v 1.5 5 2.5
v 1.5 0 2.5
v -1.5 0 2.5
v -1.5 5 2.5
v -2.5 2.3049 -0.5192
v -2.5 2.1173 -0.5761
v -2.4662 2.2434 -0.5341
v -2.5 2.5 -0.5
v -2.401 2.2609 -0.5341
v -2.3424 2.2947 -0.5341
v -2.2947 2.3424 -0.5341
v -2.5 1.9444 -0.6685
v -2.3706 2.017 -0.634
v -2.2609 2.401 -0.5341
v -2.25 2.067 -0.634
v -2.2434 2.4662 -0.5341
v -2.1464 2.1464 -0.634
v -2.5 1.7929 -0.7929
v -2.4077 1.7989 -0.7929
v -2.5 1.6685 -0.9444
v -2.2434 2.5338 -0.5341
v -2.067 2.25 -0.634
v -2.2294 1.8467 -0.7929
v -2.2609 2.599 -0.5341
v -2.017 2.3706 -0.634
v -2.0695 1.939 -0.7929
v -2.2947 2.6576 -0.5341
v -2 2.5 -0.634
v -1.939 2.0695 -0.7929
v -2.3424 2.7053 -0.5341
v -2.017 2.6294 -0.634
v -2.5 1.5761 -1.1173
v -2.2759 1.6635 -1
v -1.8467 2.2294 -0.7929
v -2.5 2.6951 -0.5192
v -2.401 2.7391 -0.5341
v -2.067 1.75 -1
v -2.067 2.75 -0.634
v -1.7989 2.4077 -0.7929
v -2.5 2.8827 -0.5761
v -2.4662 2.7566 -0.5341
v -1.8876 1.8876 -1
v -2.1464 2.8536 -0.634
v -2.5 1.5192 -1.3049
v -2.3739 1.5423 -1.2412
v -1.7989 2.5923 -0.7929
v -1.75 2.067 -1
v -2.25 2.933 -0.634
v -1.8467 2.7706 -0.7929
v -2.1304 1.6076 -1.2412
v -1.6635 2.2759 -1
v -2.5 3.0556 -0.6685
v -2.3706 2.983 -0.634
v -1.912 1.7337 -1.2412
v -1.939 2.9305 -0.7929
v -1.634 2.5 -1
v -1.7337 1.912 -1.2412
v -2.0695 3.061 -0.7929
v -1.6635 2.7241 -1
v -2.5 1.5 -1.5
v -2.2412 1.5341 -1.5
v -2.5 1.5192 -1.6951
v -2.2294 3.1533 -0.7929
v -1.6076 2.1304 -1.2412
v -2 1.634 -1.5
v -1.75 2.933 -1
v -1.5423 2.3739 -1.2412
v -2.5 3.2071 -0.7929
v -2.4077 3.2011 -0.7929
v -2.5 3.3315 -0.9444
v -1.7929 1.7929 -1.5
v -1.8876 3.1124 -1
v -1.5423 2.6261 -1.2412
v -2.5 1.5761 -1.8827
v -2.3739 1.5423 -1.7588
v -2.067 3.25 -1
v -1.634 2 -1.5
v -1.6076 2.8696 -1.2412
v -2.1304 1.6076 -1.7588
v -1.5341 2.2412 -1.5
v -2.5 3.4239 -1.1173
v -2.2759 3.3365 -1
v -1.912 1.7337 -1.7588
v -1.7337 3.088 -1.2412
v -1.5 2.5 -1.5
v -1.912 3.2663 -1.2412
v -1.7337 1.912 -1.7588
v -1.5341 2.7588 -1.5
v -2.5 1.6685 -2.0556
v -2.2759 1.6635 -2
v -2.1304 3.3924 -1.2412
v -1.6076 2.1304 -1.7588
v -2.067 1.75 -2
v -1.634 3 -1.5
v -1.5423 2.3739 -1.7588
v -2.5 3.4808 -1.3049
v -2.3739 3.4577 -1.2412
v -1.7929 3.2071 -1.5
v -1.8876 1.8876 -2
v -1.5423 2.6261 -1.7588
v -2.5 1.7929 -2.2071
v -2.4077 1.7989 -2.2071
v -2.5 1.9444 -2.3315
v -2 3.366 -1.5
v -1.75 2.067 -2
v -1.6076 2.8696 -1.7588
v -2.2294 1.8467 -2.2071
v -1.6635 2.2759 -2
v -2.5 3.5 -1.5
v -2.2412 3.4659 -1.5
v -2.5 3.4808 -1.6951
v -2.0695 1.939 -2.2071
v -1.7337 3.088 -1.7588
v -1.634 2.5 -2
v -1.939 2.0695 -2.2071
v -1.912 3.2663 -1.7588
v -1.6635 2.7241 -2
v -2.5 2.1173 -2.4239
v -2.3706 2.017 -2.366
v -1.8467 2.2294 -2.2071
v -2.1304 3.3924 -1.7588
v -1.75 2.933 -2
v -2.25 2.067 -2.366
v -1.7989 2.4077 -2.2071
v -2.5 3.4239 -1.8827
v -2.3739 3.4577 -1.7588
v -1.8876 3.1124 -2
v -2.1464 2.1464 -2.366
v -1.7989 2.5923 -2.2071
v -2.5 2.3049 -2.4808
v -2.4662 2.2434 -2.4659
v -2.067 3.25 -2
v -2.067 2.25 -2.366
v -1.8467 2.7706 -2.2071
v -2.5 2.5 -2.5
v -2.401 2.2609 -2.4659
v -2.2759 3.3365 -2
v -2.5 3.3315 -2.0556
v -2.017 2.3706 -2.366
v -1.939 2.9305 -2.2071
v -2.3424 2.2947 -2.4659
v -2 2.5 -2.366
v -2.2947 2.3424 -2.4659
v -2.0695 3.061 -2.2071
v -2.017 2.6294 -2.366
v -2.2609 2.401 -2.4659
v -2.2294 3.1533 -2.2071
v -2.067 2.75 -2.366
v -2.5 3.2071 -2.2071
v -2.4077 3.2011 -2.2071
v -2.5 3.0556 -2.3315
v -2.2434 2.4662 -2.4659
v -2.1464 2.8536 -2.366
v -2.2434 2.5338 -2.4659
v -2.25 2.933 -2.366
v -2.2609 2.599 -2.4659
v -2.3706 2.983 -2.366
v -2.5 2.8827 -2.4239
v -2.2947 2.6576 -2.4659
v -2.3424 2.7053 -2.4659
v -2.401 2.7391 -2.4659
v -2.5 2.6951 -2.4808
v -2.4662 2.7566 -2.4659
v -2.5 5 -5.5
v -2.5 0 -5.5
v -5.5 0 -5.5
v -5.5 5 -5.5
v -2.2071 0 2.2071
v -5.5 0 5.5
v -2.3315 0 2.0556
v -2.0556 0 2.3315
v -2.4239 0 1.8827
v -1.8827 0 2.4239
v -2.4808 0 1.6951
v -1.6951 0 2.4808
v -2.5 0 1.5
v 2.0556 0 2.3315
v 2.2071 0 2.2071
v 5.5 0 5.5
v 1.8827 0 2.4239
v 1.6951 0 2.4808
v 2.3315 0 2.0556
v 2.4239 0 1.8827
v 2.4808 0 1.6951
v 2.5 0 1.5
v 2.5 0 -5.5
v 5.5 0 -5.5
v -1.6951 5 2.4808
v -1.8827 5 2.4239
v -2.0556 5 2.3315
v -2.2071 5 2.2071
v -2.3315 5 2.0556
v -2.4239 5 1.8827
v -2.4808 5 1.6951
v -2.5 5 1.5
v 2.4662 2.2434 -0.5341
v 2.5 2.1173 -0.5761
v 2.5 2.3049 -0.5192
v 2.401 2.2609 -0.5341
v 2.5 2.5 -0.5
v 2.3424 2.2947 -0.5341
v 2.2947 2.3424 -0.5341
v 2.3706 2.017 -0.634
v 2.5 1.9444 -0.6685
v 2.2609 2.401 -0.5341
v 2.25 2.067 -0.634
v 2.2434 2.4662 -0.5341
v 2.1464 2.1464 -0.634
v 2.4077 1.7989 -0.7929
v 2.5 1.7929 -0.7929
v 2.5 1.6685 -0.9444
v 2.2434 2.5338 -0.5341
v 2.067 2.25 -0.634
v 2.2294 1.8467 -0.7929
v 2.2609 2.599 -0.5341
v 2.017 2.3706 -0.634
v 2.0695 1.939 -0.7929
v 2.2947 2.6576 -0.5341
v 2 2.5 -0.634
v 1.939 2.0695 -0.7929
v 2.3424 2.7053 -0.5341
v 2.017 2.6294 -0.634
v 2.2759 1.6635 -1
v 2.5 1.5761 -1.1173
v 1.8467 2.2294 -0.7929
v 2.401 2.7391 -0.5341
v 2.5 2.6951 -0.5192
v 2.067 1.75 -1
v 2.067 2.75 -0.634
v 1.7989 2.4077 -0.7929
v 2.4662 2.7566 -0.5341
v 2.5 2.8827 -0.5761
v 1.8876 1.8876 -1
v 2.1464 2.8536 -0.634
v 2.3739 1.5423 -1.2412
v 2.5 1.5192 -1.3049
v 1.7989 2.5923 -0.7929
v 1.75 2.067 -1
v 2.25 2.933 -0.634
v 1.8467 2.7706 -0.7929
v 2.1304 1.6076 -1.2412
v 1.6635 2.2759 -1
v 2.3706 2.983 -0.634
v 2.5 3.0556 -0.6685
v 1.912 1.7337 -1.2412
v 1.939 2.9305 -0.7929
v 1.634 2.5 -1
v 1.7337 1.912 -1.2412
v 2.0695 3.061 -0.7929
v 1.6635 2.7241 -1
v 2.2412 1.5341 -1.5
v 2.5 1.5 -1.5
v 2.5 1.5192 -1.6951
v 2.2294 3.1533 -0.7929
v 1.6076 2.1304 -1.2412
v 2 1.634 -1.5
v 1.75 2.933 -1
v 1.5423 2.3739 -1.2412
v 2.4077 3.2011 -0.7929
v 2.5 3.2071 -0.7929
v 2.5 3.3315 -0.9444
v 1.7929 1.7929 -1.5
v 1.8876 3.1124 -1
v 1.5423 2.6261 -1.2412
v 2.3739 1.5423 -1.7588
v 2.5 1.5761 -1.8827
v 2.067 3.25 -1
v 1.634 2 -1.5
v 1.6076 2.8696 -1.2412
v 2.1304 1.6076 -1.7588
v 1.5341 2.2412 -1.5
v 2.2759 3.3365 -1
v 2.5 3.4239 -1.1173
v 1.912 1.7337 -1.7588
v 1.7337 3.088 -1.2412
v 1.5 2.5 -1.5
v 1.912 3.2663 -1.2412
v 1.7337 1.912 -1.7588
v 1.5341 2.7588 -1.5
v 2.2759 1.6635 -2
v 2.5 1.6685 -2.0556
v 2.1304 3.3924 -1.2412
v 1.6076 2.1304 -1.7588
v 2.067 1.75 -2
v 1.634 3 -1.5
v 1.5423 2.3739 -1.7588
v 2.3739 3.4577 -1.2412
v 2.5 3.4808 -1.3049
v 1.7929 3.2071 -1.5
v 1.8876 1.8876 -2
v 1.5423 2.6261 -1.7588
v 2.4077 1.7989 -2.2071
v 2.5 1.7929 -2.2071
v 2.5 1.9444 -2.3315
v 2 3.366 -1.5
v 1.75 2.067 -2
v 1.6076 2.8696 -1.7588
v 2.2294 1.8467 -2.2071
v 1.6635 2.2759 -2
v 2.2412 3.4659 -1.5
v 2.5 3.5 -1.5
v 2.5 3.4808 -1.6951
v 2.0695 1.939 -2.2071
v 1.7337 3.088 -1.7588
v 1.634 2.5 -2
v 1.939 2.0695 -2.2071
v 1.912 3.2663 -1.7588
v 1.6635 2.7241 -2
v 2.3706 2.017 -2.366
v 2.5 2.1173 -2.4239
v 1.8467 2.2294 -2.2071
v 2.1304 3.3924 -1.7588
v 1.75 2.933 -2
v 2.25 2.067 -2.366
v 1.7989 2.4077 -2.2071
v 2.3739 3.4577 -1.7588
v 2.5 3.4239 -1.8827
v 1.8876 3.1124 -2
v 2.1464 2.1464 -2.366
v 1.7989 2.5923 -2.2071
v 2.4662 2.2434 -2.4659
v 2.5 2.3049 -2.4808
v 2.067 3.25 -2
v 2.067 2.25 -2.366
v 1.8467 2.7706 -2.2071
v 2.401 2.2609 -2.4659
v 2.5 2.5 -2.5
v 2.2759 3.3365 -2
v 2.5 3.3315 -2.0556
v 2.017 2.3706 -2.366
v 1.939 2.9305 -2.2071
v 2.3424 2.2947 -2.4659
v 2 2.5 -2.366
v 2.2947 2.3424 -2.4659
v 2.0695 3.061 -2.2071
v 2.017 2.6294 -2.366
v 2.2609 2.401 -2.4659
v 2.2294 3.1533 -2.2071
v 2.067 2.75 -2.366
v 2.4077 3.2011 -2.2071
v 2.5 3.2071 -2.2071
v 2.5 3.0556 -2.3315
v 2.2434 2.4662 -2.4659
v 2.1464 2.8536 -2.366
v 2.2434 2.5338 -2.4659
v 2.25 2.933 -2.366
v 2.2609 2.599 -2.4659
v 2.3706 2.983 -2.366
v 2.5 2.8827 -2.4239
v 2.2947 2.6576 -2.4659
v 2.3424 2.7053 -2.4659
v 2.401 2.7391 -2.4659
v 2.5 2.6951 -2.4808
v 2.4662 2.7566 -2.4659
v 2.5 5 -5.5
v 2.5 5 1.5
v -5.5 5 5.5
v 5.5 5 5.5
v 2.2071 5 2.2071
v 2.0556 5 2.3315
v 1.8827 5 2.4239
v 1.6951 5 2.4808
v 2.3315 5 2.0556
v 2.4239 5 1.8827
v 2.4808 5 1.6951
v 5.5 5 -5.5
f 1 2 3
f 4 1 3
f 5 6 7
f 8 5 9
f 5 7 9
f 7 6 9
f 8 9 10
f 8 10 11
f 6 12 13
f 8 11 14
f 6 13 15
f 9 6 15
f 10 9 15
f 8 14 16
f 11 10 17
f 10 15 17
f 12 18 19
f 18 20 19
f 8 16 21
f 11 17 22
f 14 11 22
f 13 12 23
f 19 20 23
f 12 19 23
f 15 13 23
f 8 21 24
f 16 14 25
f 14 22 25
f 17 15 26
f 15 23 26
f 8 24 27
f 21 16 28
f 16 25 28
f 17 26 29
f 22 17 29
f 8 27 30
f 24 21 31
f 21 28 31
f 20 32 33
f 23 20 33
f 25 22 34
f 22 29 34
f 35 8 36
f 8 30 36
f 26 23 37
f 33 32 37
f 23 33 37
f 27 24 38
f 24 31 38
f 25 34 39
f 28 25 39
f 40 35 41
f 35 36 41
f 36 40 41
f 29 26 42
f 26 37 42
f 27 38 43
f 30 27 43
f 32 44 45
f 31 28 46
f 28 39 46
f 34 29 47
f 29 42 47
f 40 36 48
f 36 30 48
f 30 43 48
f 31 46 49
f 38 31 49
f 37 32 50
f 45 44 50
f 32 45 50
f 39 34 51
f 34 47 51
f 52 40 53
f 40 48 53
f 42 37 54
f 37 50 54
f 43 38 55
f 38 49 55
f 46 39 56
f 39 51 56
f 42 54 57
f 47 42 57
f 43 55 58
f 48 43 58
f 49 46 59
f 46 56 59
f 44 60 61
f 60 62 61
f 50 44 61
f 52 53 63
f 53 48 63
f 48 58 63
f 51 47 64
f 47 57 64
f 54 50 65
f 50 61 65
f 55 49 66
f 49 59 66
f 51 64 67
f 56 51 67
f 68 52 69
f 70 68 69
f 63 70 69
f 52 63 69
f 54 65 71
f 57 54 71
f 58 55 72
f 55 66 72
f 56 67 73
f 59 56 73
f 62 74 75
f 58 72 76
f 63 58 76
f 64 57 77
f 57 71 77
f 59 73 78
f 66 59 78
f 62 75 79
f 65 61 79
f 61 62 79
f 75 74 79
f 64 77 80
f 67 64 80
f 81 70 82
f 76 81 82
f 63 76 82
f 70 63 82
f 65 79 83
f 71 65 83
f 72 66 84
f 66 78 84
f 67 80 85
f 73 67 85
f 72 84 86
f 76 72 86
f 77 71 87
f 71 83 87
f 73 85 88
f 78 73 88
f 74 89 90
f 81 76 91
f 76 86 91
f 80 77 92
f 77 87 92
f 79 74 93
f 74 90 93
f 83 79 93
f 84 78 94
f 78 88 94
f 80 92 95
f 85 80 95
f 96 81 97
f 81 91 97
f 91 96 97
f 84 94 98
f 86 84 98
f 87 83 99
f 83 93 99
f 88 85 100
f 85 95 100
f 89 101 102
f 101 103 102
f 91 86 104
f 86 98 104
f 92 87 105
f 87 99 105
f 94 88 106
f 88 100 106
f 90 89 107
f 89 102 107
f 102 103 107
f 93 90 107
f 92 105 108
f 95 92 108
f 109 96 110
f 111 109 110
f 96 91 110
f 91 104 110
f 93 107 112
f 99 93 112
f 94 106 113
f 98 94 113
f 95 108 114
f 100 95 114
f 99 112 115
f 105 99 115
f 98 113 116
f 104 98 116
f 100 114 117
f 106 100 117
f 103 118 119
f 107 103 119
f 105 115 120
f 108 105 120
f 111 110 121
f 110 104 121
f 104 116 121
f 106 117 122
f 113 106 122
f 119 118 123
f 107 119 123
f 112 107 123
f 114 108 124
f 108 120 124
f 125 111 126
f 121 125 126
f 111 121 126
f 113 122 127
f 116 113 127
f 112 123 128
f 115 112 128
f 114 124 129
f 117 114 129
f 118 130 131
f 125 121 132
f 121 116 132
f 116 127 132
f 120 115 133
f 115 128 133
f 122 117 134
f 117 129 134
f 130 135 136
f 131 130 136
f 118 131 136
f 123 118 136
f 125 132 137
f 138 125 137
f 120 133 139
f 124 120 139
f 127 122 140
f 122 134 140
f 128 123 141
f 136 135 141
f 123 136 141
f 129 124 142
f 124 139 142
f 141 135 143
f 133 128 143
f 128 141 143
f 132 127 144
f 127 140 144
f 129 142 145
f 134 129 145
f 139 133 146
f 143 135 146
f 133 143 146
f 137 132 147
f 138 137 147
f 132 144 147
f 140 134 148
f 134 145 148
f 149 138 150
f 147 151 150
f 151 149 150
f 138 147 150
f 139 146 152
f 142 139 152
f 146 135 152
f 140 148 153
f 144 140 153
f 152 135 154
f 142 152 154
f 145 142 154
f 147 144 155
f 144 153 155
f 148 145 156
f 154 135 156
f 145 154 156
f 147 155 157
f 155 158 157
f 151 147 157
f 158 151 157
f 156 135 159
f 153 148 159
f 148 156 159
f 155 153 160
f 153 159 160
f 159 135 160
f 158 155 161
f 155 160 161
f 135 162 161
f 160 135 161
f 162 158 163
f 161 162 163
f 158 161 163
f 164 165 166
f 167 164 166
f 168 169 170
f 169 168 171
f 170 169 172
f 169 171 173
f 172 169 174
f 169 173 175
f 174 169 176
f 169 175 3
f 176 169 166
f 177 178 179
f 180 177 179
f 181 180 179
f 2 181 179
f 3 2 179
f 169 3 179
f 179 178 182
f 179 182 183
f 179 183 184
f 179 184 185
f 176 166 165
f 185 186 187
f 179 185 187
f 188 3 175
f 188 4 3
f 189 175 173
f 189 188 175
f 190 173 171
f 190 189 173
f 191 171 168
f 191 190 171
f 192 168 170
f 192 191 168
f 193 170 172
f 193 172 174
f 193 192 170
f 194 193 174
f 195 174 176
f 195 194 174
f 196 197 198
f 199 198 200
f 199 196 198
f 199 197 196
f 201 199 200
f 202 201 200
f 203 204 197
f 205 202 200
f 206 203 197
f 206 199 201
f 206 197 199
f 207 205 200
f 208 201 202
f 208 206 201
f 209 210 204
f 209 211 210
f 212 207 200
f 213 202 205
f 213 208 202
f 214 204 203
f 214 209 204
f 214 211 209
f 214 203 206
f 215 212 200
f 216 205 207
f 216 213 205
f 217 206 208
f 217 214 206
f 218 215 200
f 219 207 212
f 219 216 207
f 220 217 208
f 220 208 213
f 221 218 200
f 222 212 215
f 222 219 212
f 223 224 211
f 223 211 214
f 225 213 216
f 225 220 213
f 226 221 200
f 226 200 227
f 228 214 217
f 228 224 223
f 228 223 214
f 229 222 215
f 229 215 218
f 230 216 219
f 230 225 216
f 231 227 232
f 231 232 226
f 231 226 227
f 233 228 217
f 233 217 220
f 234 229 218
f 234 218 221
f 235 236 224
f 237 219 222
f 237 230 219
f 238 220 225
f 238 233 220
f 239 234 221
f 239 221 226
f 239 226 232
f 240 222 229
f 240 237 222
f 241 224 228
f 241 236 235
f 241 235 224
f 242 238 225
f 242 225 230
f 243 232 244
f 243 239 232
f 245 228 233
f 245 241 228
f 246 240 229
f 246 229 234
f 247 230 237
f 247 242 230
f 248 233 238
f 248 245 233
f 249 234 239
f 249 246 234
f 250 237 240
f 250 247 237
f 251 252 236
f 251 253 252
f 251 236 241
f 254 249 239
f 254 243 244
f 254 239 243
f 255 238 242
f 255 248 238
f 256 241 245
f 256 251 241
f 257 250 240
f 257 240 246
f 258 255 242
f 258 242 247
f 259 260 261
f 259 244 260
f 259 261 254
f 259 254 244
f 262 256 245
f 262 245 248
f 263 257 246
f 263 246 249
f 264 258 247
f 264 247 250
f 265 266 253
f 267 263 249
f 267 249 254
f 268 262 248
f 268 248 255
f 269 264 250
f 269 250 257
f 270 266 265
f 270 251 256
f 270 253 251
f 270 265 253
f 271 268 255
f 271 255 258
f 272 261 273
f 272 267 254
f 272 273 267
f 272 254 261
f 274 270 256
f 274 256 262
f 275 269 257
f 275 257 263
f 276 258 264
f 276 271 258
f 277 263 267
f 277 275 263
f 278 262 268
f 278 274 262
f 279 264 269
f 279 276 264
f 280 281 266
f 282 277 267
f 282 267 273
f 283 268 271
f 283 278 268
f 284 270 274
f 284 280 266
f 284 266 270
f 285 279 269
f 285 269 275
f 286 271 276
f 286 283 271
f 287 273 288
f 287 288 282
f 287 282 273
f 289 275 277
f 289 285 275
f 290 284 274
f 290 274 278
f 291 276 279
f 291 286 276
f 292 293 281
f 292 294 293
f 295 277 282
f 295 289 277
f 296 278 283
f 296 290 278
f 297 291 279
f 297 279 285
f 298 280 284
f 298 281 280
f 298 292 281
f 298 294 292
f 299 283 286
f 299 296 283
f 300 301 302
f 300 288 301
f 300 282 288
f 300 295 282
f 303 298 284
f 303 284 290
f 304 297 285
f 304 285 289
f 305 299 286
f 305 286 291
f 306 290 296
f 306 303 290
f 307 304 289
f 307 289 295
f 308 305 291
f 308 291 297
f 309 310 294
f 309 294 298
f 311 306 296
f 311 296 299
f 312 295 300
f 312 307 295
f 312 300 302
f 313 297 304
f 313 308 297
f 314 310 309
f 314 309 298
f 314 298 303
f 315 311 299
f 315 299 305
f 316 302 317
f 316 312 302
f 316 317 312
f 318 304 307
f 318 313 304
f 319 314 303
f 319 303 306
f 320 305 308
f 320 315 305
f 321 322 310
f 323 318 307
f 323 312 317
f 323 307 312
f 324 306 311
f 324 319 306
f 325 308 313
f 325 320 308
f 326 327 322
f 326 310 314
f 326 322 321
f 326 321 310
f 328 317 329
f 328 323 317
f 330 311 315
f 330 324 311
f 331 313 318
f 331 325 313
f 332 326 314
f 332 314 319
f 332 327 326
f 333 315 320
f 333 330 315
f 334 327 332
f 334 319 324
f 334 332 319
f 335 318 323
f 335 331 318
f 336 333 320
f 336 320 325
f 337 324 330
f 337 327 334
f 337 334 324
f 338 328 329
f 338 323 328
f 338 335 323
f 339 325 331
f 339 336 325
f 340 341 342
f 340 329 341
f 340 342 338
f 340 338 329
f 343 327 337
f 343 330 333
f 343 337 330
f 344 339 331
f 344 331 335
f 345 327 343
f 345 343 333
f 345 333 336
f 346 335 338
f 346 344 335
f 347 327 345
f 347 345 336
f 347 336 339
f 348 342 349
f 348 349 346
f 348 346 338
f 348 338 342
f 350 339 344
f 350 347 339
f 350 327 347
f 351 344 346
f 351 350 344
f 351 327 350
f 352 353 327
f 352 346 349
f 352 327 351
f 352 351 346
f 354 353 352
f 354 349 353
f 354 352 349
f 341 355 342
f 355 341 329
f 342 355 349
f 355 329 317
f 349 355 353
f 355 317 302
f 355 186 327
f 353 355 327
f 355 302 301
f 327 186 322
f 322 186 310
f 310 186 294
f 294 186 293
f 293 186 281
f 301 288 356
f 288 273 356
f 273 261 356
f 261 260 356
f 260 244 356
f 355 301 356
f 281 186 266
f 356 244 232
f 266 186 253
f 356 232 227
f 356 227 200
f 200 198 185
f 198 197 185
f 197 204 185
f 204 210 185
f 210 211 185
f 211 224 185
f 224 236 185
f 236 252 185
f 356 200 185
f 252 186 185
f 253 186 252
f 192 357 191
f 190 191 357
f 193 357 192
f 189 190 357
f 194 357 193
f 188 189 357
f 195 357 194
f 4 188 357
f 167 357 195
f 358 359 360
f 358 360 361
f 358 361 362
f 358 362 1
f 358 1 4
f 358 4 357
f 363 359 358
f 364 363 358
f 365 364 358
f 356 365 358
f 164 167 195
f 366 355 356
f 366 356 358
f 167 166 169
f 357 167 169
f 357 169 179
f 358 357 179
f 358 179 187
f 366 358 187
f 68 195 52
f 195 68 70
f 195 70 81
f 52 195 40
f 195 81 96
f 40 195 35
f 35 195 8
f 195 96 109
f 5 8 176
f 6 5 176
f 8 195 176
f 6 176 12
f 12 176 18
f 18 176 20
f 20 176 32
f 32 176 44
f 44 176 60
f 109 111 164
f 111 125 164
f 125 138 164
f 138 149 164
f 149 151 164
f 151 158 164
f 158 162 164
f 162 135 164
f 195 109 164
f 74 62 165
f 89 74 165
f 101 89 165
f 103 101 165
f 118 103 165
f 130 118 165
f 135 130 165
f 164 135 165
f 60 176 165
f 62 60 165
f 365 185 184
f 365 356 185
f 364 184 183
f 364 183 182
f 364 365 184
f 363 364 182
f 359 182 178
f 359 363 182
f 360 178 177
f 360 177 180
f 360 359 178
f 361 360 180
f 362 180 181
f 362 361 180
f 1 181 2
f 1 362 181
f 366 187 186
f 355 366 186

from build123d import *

# Parameters (mm, degrees)
BOSS_EXTRUDE1_DEPTH = 5
FILLET1_R           = 1


with BuildPart() as part:
    # Sketch1 → Boss-Extrude1 (new body)
    with BuildSketch(Plane(origin=(0, 0, 0), x_dir=(1, 0, 0), z_dir=(0, 1, 0))):
        Polygon((-5.5, 5.5), (-5.5, -5.5), (5.5, -5.5), (5.5, 5.5), (2.5, 5.5), (2.5, 2.5), (2.5, -2.5), (-2.5, -2.5), (-2.5, 2.5), (-2.5, 5.5), align=None)
    extrude(amount=BOSS_EXTRUDE1_DEPTH)

    # Sketch2 → Revolve1 (revolve)
    with BuildSketch(Plane(origin=(-2.5, 0, 0), x_dir=(0, 0, -1), z_dir=(1, 0, 0))):
        with BuildLine():
            Line((2.5, 2.5), (0.5, 2.5))
            ThreePointArc((0.5, 2.5), (1.5, 1.5), (2.5, 2.5))
        make_face()
    revolve1 = revolve(axis=Axis((-2.5, 2.5, -5.5), (0, 0, 1)))

    # Mirror1: Revolve1 across plane
    add(revolve1.mirror(Plane(origin=(0, 0, 0), x_dir=(0, 0, 1), z_dir=(1, 0, 0))))

    # Fillet1
    fillet1_edges = [part.edges().sort_by_distance(p)[0] for p in [
        (-2.5, 2.5, 2.5),
        (2.5, 2.5, 2.5),
    ]]
    fillet(fillet1_edges, radius=FILLET1_R)


solid = part.part
